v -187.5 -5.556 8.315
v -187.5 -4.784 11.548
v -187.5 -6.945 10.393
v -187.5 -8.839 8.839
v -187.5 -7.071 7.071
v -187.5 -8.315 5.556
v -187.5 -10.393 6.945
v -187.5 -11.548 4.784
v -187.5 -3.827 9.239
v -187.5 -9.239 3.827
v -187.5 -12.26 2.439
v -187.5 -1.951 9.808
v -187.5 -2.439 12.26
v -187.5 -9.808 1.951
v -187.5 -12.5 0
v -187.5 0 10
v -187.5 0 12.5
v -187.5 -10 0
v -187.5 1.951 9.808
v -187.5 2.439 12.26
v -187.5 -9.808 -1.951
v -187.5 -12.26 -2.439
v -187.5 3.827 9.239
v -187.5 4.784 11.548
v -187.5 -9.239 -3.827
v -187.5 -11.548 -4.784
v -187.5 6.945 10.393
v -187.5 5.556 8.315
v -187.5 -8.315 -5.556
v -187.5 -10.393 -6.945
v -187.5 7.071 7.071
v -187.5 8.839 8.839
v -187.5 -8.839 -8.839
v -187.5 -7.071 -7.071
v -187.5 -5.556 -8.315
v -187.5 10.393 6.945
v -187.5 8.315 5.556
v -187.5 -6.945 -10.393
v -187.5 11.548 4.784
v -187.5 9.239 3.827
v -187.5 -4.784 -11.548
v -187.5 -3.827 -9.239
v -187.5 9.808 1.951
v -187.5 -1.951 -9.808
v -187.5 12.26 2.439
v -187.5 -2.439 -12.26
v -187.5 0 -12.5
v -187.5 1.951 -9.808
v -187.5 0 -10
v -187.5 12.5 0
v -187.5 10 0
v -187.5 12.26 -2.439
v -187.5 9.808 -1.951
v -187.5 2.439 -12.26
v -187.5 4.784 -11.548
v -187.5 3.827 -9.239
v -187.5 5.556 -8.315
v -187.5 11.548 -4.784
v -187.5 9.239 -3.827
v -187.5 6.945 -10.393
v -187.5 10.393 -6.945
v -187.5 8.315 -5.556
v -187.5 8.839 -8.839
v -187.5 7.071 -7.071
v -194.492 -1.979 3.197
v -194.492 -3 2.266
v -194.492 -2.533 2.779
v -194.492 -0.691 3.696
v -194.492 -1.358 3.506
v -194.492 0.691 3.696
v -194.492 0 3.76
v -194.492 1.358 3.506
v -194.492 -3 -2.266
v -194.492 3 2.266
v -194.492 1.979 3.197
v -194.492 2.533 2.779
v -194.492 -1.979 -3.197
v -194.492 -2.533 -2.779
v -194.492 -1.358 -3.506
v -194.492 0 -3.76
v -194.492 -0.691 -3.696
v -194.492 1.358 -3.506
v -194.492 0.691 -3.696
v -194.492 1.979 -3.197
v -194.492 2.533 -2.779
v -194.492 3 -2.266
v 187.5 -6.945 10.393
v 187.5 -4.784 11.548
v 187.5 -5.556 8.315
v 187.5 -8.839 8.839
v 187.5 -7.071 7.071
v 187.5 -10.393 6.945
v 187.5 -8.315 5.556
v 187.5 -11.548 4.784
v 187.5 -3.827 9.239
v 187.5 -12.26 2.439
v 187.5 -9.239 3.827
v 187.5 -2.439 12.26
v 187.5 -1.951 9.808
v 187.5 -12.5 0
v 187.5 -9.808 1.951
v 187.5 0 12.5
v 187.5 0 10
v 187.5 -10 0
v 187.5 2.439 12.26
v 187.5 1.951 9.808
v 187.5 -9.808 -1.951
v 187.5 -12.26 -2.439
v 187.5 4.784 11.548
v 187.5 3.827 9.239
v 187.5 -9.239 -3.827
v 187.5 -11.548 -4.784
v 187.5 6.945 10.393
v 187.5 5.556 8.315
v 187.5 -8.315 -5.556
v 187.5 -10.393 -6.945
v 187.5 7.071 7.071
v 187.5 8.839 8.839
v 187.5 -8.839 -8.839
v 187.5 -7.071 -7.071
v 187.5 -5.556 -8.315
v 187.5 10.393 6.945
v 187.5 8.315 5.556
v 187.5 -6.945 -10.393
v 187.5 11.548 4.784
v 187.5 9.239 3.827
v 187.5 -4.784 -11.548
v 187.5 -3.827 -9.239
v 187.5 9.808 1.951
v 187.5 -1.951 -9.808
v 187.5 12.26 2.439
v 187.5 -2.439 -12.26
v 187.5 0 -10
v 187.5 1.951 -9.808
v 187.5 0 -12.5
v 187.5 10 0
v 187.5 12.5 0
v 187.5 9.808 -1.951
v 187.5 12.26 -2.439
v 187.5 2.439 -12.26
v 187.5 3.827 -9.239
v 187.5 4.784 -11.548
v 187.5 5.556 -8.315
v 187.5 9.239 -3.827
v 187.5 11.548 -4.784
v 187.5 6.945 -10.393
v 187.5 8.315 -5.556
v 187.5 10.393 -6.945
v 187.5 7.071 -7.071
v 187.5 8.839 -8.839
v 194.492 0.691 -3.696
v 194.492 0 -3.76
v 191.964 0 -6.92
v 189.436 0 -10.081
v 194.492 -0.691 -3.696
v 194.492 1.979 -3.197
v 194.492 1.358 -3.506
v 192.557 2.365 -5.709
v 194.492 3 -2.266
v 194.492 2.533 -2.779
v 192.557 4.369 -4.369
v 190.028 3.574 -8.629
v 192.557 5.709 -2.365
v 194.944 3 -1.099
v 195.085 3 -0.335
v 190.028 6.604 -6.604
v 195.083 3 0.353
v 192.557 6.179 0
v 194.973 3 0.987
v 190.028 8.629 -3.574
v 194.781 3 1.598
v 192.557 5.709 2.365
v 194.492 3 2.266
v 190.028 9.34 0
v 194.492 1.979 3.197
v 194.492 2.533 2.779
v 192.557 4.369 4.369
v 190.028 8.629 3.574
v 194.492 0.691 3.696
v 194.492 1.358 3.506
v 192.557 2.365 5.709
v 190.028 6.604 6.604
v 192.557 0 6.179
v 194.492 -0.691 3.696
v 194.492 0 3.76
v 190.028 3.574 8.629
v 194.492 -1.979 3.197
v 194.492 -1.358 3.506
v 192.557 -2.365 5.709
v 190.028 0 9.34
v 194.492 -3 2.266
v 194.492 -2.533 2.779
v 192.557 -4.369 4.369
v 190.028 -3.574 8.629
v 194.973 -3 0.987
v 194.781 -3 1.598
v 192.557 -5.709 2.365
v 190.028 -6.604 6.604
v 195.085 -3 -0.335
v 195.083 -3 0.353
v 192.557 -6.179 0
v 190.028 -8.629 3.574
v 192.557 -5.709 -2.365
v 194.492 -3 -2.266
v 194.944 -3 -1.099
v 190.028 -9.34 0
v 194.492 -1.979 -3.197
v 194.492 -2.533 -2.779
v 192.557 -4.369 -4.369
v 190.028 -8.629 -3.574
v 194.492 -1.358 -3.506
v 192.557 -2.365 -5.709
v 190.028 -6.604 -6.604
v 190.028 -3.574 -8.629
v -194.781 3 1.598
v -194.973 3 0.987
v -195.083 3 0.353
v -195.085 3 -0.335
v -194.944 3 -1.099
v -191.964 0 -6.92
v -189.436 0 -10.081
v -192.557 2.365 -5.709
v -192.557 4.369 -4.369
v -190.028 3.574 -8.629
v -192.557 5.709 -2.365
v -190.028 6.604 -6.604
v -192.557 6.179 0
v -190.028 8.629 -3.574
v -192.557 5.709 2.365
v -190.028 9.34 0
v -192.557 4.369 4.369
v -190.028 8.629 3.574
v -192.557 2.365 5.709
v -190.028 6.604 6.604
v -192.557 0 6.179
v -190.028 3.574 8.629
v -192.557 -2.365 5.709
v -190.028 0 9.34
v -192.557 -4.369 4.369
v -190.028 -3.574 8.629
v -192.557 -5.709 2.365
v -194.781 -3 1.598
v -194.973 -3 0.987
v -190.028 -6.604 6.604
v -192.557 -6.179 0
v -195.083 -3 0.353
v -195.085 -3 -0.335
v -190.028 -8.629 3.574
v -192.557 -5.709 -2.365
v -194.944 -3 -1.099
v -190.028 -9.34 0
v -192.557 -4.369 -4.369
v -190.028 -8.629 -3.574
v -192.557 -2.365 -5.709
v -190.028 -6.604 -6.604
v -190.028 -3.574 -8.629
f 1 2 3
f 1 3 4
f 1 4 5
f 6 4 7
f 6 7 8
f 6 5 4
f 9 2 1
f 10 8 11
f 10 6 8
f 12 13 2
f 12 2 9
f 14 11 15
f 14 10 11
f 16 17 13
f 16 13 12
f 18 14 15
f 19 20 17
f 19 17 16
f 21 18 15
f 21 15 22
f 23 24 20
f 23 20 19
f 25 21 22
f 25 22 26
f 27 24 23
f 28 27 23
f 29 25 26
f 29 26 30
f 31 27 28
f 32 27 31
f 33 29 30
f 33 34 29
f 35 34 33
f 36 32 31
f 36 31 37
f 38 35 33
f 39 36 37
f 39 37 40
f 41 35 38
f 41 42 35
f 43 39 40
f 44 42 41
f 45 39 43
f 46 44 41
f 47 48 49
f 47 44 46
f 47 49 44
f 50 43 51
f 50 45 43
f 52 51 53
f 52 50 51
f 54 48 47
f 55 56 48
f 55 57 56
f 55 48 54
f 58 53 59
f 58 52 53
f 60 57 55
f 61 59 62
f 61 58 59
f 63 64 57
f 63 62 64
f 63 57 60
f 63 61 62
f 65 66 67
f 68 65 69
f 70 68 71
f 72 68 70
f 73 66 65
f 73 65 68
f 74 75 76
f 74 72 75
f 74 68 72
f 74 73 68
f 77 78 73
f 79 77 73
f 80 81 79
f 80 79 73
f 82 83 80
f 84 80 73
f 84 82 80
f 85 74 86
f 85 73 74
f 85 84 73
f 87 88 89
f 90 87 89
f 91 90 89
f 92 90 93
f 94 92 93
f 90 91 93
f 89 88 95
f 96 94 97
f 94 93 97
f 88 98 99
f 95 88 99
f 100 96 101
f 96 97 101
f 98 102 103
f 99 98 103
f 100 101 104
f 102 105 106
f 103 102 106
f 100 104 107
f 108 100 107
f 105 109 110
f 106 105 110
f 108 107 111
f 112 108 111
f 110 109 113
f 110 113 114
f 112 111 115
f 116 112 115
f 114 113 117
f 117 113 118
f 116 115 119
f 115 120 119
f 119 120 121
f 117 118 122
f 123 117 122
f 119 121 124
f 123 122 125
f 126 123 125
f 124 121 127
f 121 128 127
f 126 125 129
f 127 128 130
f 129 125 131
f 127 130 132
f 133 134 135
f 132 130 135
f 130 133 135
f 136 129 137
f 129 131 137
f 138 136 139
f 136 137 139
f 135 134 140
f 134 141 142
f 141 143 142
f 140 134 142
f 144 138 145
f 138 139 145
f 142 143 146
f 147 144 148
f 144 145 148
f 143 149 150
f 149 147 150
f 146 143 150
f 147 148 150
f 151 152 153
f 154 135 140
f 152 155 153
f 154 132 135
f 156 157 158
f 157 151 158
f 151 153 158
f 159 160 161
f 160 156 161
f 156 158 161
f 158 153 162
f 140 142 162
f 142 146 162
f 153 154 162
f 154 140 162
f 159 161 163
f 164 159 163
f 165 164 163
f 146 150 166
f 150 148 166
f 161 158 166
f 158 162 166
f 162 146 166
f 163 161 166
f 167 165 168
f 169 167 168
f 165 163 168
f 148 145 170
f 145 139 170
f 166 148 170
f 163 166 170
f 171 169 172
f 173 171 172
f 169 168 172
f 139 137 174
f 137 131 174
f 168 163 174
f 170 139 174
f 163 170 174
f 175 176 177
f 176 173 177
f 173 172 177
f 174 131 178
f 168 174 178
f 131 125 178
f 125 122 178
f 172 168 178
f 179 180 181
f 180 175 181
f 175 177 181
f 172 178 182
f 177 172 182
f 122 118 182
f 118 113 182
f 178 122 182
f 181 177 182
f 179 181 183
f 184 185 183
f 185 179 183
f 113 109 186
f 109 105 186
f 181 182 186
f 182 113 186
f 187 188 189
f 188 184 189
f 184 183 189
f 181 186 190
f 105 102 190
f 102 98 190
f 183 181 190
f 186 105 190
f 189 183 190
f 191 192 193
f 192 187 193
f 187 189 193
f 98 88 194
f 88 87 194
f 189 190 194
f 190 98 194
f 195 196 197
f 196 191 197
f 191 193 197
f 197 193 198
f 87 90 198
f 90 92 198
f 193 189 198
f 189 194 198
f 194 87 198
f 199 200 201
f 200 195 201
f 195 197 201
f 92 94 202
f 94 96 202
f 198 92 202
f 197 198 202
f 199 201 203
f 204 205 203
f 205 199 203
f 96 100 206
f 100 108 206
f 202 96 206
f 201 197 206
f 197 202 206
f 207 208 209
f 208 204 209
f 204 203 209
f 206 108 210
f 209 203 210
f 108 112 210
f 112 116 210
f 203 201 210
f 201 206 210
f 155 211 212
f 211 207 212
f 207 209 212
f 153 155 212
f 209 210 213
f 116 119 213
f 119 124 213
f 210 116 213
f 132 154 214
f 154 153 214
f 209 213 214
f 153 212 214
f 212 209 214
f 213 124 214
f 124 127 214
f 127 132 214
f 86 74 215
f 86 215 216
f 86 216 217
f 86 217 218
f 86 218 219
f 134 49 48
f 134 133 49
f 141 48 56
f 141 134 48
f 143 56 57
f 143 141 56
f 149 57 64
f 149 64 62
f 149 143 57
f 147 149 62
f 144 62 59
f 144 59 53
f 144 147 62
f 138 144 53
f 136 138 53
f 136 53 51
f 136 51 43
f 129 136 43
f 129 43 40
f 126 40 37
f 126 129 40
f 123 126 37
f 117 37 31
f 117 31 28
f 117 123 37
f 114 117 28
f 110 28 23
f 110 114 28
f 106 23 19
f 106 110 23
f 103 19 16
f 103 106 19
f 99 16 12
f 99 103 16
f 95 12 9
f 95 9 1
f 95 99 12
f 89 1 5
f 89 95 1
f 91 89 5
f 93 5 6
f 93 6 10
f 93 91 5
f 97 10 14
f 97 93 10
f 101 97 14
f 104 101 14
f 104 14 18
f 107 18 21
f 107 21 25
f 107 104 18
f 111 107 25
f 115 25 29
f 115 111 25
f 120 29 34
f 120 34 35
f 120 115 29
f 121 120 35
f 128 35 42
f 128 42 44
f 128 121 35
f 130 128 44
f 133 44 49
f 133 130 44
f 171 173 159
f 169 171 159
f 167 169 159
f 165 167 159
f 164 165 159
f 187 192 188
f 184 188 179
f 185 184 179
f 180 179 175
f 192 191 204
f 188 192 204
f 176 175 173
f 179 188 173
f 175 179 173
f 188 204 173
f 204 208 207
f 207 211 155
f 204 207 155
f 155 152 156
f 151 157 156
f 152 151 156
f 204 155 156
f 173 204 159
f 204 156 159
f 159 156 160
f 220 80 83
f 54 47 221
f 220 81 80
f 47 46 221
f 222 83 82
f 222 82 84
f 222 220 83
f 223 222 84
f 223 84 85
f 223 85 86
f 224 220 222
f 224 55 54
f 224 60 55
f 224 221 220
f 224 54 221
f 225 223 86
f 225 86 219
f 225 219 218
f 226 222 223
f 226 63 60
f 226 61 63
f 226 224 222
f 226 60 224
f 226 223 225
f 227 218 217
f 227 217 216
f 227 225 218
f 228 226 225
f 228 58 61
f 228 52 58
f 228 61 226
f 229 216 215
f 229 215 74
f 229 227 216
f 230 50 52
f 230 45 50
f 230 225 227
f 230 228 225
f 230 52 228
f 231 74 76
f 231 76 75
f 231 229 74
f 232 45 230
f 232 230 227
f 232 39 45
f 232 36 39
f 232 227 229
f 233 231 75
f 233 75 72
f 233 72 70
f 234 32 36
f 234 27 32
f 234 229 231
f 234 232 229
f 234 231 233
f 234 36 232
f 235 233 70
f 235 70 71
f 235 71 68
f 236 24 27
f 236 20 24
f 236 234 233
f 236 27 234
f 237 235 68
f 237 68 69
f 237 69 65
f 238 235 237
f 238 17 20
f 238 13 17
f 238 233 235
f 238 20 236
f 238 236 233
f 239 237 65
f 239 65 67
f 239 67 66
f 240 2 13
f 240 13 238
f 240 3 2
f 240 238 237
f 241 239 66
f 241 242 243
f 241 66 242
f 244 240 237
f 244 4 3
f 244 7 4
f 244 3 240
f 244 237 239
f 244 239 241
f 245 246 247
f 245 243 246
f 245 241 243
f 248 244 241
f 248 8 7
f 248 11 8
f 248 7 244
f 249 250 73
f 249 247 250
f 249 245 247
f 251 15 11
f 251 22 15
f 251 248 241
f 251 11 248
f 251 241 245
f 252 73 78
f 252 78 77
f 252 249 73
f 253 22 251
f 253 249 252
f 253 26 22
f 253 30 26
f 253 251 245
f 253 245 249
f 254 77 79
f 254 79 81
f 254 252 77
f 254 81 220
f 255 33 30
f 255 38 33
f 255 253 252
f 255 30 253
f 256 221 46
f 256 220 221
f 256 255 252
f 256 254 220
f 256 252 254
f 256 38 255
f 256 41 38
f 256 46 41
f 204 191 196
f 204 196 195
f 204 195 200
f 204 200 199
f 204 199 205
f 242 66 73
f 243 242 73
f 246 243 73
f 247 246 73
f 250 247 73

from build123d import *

# Parameters (mm, degrees)
SKETCH1_R           = 10
BOSS_EXTRUDE1_DEPTH = 187.5
SKETCH3_R           = 12.5
CUT_EXTRUDE1_START  = -199.289561108
SKETCH4_W           = 4
SKETCH4_H           = 6
CUT_EXTRUDE1_DEPTH  = 209.289561108


with BuildPart() as part:
    # Sketch1 → Boss-Extrude1 (new, symmetric)
    with BuildSketch(Plane(origin=(0, 0, 0), x_dir=(0, 0, -1), z_dir=(1, 0, 0))):
        Circle(SKETCH1_R)
    extrude(amount=BOSS_EXTRUDE1_DEPTH, both=True)

    # Sketch3 → Loft1 section 0
    with BuildSketch(Plane(origin=(187.5, 0, 0), x_dir=(0, 0, -1), z_dir=(1, 0, 0)), mode=Mode.PRIVATE) as loft1_s0:
        Circle(SKETCH3_R)
    loft1 = loft([Vertex(197.5, 0, 0), loft1_s0.sketch])

    # Mirror1: Loft1 across plane
    add(loft1.mirror(Plane(origin=(0, 0, 0), x_dir=(0, 0, 1), z_dir=(1, 0, 0))))

    # Sketch4 → Cut-Extrude1 (cut)
    with BuildSketch(Plane.XY.offset(CUT_EXTRUDE1_START)):
        with Locations((196.492262498, 0)):
            Rectangle(SKETCH4_W, SKETCH4_H)
    cut_extrude1 = extrude(amount=CUT_EXTRUDE1_DEPTH, mode=Mode.SUBTRACT)

    # Mirror2: Cut-Extrude1 across plane
    add(cut_extrude1.mirror(Plane(origin=(0, 0, 0), x_dir=(0, 0, 1), z_dir=(1, 0, 0))), mode=Mode.SUBTRACT)


solid = part.part
